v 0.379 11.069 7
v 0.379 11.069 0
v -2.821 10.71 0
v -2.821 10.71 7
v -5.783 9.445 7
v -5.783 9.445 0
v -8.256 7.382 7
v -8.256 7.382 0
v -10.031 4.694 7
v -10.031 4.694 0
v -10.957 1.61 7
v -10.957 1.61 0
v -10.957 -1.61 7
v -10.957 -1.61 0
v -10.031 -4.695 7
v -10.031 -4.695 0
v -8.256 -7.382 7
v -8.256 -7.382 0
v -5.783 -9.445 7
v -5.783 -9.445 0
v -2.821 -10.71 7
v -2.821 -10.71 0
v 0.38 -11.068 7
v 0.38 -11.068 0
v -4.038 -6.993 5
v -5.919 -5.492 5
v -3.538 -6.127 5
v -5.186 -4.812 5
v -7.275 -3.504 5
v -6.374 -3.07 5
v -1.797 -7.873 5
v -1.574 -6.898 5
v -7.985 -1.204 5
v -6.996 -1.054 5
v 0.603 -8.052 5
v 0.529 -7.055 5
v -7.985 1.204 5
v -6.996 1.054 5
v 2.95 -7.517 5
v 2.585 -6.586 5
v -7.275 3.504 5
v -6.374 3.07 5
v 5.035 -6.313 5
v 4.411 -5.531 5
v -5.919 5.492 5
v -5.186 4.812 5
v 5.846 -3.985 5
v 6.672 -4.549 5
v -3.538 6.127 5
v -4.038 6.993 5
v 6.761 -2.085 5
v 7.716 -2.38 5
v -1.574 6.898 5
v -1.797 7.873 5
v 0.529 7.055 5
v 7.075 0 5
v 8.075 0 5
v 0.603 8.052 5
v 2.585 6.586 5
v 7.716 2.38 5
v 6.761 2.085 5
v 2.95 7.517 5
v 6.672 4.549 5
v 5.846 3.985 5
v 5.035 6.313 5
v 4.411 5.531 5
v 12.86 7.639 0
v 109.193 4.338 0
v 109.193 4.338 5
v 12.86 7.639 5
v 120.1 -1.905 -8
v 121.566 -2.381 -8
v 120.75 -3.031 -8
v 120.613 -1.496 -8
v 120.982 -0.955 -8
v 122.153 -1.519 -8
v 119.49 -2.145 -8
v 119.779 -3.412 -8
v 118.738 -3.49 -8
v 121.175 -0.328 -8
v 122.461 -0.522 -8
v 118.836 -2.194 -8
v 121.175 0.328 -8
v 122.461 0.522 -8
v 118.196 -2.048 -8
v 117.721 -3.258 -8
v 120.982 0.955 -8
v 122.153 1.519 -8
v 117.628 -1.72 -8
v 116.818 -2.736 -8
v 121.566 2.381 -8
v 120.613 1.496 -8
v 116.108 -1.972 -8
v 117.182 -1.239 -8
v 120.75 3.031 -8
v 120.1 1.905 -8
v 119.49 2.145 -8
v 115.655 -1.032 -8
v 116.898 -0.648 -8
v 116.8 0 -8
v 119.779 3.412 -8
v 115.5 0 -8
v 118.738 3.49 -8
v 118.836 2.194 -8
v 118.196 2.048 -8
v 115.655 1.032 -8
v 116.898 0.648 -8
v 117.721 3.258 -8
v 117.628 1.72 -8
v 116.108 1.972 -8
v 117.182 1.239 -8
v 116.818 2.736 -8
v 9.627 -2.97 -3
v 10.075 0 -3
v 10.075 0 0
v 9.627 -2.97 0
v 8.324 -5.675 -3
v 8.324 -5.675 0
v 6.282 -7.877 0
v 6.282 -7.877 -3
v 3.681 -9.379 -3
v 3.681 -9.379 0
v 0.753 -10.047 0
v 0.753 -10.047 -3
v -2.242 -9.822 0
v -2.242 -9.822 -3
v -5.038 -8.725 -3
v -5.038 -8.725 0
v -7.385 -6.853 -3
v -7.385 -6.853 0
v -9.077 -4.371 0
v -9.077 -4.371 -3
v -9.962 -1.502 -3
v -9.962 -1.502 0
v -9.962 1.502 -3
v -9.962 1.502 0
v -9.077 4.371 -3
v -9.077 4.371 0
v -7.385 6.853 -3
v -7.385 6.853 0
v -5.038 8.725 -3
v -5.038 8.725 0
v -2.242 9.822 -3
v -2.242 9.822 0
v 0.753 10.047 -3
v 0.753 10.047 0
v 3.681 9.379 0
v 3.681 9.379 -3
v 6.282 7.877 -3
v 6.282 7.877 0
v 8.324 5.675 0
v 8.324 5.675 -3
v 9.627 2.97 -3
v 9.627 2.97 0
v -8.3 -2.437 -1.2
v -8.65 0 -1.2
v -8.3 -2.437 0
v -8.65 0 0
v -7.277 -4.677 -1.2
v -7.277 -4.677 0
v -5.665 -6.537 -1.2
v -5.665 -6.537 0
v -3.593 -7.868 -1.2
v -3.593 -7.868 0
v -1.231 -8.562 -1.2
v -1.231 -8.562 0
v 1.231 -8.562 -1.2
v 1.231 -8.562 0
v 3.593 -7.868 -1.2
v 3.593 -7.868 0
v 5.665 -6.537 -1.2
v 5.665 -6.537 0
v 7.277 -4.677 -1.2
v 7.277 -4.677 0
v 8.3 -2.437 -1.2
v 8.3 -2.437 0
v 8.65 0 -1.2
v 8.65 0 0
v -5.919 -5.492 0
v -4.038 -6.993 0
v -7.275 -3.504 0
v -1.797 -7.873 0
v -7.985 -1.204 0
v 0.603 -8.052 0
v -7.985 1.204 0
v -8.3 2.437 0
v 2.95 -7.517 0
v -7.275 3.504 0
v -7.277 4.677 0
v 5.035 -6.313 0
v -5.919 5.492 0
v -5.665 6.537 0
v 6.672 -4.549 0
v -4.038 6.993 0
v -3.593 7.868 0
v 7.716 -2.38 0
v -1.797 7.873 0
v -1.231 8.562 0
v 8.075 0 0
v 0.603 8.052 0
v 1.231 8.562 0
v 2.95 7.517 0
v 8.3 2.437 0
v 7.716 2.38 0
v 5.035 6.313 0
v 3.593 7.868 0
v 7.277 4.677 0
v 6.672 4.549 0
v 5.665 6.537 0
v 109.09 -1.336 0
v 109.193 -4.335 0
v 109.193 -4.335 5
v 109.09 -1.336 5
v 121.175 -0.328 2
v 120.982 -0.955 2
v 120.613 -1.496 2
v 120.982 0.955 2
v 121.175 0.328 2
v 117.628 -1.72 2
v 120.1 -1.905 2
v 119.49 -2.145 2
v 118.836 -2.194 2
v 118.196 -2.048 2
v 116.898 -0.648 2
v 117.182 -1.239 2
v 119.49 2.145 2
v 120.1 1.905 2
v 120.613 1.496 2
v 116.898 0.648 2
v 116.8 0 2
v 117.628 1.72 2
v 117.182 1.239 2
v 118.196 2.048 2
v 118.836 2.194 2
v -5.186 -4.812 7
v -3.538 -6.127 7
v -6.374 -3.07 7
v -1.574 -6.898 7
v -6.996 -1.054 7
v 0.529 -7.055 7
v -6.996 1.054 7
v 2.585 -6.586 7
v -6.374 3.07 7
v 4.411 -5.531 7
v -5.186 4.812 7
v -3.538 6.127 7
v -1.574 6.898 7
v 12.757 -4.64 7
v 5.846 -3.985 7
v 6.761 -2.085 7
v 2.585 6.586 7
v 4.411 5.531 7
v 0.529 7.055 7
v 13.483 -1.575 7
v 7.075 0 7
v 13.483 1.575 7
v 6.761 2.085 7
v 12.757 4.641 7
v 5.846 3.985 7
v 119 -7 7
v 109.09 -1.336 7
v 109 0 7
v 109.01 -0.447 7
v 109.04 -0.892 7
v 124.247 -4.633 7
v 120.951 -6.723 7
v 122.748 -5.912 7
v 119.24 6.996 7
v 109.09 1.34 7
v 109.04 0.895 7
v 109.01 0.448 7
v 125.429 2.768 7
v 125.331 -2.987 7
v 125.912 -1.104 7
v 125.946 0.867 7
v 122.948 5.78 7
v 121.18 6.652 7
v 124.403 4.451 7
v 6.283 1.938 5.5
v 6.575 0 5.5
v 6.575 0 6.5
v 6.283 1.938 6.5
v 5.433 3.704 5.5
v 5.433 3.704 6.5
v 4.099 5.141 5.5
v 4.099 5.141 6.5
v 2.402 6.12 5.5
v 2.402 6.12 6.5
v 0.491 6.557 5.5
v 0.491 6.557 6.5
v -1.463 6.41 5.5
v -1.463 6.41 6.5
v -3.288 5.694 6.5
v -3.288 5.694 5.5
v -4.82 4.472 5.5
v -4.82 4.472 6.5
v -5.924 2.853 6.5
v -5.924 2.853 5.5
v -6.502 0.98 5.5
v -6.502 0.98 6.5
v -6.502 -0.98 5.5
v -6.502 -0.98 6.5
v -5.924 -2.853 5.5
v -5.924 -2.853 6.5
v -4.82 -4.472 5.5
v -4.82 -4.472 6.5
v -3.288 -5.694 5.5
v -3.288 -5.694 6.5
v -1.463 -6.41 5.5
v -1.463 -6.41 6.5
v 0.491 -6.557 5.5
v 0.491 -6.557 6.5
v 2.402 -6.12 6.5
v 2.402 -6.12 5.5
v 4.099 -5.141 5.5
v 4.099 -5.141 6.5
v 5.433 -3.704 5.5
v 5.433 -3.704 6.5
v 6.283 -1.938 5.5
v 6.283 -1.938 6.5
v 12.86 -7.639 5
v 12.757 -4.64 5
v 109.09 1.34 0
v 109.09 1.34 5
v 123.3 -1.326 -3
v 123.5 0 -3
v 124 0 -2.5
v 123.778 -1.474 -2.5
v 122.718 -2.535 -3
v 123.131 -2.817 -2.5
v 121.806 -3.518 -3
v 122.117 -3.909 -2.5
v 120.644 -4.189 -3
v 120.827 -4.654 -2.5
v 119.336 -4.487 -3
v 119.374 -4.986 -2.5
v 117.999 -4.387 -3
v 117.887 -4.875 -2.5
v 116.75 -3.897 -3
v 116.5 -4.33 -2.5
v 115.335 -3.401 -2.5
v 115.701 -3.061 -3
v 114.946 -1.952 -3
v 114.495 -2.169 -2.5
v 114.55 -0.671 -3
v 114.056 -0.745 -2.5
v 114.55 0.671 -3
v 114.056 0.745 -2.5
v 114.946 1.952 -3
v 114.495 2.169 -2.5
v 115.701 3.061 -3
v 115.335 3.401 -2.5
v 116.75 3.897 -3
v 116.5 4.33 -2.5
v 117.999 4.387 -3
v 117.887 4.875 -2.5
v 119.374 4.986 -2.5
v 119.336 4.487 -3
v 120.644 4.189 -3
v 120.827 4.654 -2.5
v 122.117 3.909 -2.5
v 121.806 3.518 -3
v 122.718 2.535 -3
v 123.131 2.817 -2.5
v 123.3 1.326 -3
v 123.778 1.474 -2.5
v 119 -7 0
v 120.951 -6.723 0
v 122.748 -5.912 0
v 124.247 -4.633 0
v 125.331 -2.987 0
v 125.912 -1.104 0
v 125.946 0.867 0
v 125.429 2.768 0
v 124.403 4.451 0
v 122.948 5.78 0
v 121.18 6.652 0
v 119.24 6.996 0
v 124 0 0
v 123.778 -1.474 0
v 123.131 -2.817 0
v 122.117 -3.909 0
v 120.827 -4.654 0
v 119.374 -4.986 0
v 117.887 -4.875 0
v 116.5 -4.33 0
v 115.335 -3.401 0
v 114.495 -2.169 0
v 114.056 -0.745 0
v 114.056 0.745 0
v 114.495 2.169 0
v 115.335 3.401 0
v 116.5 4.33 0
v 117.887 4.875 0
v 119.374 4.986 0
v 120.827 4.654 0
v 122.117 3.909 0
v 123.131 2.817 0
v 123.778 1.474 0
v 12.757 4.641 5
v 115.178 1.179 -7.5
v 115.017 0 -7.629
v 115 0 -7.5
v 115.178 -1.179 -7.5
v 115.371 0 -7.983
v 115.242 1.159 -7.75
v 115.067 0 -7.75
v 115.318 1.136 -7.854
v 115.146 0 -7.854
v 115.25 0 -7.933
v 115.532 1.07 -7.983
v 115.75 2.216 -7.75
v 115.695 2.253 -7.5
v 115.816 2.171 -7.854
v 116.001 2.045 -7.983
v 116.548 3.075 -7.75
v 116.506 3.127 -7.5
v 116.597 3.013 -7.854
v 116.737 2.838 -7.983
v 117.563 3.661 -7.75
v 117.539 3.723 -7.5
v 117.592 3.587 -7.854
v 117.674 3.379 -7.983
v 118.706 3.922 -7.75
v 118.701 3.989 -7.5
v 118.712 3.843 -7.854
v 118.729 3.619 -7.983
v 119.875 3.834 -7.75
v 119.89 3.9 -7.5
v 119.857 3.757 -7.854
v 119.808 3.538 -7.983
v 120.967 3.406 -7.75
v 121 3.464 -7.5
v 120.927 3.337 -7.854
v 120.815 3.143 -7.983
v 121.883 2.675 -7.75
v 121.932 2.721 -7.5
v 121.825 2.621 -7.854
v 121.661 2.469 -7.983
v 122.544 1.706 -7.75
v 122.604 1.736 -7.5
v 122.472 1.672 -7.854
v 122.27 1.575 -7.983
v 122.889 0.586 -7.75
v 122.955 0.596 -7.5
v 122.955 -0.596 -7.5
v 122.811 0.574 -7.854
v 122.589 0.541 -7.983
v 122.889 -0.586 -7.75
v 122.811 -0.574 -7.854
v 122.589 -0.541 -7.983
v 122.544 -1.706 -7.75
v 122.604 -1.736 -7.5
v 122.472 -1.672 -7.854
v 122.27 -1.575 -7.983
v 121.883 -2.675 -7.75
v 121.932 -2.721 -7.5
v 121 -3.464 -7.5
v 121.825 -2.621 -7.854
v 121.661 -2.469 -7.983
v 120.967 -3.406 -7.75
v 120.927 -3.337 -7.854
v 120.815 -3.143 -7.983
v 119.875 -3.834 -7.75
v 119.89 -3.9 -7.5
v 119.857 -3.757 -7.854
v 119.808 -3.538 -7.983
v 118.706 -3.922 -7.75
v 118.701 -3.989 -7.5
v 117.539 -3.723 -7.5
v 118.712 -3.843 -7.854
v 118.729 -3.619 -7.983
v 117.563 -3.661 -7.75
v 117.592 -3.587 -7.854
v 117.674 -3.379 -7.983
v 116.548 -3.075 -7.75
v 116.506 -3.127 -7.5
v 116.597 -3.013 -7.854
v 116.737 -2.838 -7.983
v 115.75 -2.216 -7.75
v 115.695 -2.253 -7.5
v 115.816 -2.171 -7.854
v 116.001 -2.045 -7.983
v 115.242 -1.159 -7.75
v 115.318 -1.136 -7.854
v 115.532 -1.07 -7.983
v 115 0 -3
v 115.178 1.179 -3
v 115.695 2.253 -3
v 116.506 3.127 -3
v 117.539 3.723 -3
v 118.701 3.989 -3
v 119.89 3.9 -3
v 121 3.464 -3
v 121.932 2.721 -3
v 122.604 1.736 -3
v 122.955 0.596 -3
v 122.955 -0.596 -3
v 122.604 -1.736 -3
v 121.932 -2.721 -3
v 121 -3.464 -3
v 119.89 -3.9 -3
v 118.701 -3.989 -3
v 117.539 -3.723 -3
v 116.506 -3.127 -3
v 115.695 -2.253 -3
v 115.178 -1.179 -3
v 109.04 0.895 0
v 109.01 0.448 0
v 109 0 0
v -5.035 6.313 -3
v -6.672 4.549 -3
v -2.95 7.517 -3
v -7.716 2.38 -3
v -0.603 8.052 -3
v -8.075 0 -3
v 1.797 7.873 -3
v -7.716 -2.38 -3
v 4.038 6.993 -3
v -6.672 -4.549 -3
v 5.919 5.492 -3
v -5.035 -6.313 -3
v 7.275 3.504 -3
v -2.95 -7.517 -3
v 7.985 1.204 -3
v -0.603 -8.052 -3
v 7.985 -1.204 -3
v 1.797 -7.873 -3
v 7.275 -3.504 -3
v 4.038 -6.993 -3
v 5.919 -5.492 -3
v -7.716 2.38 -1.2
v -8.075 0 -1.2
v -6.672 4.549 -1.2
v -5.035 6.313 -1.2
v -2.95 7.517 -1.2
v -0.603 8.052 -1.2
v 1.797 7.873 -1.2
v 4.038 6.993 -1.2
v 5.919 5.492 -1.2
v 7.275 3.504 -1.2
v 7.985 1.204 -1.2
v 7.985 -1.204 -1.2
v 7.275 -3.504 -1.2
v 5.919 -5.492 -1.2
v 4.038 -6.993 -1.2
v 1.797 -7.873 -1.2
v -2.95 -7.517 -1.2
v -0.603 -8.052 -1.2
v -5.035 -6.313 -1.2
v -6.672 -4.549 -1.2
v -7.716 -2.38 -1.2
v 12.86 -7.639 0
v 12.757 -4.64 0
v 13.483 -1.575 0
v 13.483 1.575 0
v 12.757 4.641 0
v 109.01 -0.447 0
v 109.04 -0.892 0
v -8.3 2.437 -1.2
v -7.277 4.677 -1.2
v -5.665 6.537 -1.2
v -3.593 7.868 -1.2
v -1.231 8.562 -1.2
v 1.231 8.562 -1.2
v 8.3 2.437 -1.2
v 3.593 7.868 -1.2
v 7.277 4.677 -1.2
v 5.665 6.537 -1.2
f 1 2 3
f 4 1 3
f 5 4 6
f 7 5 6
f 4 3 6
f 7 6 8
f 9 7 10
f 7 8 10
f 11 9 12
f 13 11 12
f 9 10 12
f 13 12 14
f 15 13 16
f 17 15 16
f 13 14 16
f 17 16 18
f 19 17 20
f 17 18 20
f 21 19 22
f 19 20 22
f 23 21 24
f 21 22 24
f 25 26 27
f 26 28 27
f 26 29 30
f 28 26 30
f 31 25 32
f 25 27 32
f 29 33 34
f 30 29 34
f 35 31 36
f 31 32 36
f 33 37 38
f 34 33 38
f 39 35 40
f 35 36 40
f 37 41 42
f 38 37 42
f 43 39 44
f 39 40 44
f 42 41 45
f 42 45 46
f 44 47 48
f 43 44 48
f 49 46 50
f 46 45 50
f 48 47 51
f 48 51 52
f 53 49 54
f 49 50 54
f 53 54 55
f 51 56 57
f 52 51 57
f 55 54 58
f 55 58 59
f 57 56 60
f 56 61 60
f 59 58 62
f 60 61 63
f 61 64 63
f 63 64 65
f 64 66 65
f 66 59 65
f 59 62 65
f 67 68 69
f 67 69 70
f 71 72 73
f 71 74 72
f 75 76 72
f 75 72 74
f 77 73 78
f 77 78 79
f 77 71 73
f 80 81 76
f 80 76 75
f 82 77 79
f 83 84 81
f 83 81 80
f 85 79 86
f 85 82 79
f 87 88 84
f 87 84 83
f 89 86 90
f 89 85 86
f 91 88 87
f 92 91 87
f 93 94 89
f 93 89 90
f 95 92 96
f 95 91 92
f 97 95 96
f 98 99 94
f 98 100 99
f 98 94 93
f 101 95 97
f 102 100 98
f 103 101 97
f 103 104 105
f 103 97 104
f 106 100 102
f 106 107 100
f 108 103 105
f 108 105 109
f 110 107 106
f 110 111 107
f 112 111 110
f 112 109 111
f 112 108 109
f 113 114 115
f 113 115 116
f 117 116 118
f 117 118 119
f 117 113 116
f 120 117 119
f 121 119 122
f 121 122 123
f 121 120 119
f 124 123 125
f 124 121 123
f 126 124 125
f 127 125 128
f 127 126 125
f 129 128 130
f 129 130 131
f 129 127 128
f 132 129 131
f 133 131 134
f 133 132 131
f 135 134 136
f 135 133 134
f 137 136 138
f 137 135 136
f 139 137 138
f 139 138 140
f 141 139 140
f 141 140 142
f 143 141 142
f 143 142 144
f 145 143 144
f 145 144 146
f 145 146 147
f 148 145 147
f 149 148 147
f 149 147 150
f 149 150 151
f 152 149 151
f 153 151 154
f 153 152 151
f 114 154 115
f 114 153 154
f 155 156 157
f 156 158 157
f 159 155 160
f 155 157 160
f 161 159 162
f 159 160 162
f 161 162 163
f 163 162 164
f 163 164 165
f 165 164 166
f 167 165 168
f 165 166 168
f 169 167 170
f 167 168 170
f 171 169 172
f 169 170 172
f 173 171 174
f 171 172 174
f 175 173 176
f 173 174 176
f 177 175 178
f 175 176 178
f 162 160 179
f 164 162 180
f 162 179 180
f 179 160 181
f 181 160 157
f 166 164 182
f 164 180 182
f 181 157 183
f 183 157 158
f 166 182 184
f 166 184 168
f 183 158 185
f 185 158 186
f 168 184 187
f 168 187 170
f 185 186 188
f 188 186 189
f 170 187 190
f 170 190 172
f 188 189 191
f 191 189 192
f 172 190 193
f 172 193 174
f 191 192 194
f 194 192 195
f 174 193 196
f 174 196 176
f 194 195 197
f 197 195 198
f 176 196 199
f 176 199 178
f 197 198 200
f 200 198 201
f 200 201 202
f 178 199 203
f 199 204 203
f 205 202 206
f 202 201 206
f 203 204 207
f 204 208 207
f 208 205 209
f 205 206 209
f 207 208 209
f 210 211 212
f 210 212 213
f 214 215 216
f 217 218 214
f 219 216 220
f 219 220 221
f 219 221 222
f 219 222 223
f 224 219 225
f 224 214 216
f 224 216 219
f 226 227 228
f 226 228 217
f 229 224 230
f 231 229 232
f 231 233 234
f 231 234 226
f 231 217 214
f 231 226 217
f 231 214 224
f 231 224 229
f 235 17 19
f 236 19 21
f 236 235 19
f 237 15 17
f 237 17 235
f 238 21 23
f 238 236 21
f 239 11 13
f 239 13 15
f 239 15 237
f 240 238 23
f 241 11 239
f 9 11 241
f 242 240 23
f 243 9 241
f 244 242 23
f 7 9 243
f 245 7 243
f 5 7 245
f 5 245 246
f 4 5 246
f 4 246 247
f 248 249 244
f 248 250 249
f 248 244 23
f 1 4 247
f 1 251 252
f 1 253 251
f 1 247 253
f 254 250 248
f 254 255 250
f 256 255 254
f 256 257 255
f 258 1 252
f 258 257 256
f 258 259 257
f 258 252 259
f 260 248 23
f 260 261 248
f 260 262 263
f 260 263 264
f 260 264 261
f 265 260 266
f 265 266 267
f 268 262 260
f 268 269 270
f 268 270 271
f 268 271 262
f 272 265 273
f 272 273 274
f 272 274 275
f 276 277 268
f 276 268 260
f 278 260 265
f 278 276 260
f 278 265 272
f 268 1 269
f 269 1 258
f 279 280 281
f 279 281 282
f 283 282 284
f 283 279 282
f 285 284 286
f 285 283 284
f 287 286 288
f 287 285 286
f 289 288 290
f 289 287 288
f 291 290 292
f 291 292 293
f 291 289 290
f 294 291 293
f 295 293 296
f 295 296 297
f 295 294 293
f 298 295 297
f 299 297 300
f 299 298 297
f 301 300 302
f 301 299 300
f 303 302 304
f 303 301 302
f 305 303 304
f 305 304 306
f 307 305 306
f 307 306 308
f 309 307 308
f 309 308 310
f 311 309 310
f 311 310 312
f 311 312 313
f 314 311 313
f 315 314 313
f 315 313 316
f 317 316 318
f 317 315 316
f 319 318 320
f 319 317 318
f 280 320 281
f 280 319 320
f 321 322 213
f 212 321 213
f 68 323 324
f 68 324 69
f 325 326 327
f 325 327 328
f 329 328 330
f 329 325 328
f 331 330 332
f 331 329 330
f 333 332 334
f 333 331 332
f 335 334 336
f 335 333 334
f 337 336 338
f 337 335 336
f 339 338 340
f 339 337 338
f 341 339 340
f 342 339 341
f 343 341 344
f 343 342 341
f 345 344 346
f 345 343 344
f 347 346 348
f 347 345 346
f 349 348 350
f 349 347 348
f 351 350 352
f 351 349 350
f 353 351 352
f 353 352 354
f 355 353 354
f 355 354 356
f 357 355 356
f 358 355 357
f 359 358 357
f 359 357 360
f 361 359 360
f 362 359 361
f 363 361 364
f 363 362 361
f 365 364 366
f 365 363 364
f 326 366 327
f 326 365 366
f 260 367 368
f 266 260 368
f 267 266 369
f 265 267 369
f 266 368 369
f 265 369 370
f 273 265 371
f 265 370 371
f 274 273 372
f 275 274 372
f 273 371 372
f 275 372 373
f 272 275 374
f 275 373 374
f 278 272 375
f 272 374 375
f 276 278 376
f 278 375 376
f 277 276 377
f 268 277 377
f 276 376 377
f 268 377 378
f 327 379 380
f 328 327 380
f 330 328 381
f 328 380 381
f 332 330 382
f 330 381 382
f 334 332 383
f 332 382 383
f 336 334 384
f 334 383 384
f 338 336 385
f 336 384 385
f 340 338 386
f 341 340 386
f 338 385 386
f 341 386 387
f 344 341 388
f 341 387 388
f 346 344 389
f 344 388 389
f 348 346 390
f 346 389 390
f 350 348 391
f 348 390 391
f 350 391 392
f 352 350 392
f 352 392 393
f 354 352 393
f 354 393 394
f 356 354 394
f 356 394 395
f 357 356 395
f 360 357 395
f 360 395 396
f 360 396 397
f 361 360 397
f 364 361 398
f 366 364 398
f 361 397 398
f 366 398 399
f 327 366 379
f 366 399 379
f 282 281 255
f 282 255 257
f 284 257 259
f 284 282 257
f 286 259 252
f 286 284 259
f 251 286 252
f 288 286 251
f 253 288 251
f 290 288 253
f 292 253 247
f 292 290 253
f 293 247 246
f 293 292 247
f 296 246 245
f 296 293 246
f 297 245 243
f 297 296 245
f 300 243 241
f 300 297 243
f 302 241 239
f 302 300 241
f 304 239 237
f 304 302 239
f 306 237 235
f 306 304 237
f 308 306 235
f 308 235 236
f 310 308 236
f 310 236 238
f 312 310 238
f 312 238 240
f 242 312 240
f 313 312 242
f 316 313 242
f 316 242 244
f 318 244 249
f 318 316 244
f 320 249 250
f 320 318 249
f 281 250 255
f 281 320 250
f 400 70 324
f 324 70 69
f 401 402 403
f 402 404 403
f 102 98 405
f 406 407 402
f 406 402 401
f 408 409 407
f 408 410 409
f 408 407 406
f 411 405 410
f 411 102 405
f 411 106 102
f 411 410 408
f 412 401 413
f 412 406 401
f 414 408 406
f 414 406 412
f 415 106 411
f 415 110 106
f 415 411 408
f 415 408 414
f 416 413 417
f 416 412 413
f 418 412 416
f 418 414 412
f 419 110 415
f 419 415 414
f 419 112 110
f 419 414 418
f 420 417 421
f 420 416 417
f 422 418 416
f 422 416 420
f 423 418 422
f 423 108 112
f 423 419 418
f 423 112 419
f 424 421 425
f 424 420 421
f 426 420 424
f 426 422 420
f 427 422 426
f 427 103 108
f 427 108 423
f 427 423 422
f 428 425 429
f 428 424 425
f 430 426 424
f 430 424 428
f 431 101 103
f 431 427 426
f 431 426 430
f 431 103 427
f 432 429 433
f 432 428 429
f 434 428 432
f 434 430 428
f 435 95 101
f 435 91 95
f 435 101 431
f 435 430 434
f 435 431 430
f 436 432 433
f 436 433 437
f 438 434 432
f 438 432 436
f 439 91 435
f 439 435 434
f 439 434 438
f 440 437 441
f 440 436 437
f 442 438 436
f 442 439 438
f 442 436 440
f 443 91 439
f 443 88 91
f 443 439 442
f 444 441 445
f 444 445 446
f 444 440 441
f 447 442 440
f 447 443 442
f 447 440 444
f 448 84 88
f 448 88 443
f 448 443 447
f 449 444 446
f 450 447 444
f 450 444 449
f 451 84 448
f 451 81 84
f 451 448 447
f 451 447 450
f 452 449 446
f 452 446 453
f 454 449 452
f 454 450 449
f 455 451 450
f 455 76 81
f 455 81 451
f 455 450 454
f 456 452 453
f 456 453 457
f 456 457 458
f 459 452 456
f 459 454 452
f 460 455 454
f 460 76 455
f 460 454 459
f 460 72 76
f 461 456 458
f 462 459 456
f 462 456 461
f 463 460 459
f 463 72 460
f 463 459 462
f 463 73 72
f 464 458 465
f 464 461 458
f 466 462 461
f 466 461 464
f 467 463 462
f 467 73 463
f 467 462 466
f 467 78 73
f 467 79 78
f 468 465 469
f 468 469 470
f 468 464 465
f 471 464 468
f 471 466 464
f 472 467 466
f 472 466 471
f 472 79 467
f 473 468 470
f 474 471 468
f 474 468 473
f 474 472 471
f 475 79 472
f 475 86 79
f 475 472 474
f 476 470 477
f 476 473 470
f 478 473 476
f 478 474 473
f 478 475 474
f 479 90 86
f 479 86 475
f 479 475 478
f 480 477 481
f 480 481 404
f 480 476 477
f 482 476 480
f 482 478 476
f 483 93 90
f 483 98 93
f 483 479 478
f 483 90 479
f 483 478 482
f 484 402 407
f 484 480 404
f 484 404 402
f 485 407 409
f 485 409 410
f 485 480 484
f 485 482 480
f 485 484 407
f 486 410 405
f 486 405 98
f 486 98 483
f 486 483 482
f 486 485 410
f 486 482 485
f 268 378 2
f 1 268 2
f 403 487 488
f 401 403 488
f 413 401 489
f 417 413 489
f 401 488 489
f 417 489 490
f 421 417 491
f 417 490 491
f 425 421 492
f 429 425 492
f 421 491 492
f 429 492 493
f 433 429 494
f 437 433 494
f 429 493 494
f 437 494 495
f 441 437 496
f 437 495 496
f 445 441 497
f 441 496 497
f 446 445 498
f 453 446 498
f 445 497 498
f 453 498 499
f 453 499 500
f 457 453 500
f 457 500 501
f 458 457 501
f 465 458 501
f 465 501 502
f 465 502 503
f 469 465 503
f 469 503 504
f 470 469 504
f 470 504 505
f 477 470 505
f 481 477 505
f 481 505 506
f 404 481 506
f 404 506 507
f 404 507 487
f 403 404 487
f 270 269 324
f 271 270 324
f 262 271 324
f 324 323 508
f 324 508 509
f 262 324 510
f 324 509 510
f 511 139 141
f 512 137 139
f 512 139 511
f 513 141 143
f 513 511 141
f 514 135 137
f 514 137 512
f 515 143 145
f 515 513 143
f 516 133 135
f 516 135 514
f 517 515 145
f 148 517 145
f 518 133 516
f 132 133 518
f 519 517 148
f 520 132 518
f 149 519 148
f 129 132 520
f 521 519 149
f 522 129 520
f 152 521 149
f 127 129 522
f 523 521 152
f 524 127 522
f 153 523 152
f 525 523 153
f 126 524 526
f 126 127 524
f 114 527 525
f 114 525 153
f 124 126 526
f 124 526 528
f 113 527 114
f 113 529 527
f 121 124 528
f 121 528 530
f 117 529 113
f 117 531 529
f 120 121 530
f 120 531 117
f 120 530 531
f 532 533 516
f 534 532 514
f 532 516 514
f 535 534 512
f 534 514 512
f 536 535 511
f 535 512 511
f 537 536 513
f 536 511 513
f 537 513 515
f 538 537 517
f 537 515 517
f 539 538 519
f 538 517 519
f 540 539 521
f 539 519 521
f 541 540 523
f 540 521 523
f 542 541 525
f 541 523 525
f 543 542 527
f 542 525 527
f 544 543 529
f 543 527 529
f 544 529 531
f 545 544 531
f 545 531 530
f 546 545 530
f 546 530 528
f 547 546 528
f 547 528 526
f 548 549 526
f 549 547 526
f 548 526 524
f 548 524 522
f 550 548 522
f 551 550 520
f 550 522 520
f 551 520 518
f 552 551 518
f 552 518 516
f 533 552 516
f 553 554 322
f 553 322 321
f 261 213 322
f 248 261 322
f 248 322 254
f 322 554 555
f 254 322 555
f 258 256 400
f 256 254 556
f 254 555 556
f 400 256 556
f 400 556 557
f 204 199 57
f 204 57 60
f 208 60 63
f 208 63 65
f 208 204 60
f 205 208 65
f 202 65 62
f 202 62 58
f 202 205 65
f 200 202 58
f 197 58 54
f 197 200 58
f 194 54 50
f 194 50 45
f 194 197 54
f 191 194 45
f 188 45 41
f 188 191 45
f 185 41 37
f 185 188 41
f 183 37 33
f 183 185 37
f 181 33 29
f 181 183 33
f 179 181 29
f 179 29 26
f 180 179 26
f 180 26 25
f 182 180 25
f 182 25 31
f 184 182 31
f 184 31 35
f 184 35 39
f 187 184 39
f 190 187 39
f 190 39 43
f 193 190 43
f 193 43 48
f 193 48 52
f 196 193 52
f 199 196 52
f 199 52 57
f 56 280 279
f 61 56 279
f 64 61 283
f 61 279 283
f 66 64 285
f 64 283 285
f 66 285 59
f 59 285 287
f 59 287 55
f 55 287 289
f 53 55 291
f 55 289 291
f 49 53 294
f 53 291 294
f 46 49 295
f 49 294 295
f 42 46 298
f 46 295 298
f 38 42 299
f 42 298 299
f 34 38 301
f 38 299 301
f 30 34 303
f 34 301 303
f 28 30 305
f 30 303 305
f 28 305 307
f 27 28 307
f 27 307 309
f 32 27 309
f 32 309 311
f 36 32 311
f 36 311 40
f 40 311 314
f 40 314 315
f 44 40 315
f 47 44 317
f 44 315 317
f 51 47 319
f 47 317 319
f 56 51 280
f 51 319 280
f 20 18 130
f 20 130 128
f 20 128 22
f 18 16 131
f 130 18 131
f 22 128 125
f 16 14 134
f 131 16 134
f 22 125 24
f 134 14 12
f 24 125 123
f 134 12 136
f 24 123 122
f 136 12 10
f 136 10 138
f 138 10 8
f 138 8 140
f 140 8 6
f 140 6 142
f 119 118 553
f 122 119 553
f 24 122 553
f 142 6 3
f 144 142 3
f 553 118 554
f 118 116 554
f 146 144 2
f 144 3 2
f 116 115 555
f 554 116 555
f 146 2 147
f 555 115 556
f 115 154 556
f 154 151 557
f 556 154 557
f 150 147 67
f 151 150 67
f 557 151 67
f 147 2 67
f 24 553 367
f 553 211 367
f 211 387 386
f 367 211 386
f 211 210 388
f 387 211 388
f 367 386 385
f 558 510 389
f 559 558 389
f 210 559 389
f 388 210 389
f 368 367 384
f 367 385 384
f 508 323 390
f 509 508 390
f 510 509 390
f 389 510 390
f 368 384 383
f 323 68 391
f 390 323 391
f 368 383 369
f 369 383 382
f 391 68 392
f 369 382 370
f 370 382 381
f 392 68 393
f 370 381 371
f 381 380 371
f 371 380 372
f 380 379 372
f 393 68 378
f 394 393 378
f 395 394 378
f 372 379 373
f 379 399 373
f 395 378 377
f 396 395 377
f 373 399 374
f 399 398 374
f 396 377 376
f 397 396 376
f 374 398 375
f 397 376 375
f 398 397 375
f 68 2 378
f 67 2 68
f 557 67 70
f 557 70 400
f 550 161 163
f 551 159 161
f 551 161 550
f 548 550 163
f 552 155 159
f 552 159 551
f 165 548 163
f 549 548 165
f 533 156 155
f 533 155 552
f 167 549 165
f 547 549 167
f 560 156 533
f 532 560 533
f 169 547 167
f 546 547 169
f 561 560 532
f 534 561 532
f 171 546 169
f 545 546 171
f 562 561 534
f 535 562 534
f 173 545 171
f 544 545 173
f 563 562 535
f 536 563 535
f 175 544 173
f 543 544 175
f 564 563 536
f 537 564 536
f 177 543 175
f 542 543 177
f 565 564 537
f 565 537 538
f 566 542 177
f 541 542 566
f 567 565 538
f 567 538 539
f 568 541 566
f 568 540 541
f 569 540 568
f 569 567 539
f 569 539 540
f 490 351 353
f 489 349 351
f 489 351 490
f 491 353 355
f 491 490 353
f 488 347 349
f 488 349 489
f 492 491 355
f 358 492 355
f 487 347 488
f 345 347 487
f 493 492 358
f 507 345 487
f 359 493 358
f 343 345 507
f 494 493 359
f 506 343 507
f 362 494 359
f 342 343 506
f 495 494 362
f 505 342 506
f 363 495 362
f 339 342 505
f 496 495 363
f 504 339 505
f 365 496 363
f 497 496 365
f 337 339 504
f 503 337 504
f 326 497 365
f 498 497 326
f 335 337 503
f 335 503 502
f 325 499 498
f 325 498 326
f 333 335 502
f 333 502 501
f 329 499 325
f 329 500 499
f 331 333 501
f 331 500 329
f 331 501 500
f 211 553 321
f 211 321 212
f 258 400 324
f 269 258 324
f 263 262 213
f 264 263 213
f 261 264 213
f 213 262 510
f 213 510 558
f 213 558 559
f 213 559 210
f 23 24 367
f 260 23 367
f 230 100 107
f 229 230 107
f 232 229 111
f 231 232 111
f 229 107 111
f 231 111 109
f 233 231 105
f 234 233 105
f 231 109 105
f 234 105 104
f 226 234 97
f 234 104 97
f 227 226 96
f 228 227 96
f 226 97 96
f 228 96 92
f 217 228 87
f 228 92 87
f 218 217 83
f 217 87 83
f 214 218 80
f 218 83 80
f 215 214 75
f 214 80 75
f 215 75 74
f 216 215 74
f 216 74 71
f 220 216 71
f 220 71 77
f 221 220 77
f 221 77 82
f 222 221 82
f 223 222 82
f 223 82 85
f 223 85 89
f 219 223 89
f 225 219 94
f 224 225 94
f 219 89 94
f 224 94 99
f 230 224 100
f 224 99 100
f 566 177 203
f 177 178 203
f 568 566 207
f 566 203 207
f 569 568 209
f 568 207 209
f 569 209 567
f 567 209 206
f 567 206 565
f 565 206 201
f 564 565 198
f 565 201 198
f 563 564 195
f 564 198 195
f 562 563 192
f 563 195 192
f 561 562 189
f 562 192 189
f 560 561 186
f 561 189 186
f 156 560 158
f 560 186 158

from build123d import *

# Parameters (mm, degrees)
SKETCH_1_R          = 8.075
EXTRUDE_1_DEPTH     = 7
EXTRUDE_START       = -2
SKETCH_2_R          = 8.075
SKETCH_2_R_2        = 6.575
EXTRUDE_2_DEPTH     = 2
SKETCH_3_R          = 4
EXTRUDE_3_DEPTH     = 10
SKETCH_4_R          = 5
SKETCH_4_R_2        = 4
EXTRUDE_4_DEPTH     = 3
CHAMFER_1_SIZE      = 0.5
CUT_EXTRUDE_1_DEPTH = 7
CUT_EXTRUDE_2_DEPTH = 5
CUT_EXTRUDE_START   = -2
SKETCH_8_R          = 4
CUT_EXTRUDE_3_DEPTH = 2
FILLET_1_R          = 0.5
SKETCH_9_R          = 2.2
CUT_EXTRUDE_4_DEPTH = 10
EXTRUDE_START_2     = 3
SKETCH_10_R         = 10.075
SKETCH_10_R_2       = 8.075
EXTRUDE_5_DEPTH     = 3


with BuildPart() as part:
    # 草图1 → 凸台-拉伸1 (new body)
    with BuildSketch(Plane.XY):
        with BuildLine():
            ThreePointArc((0.37924895, 11.068504652), (-11.074999998, -0.000191538), (0.379631801, -11.068491528))
            Line((0.379631801, -11.068491528), (119, -7))
            ThreePointArc((119, -7), (125.998973572, -0.119870518), (119.239705882, 6.995894588))
            Line((119.239705882, 6.995894588), (0.37924895, 11.068504652))
        make_face()
        Circle(SKETCH_1_R, mode=Mode.SUBTRACT)
    extrude(amount=EXTRUDE_1_DEPTH)

    # 草图2 → 凸台-拉伸2 (add)
    with BuildSketch(Plane.XY.offset(7).offset(EXTRUDE_START)):
        Circle(SKETCH_2_R)
        Circle(SKETCH_2_R_2, mode=Mode.SUBTRACT)
    extrude(amount=EXTRUDE_2_DEPTH)

    # 草图3 → 凸台-拉伸3 (add)
    with BuildSketch(Plane(origin=(0, 0, 0), x_dir=(-1, 0, 0), z_dir=(0, 0, -1))):
        with Locations((-119, 0)):
            Circle(SKETCH_3_R)
    extrude(amount=EXTRUDE_3_DEPTH)

    # 草图4 → 凸台-拉伸4 (add)
    with BuildSketch(Plane(origin=(0, 0, 0), x_dir=(-1, 0, 0), z_dir=(0, 0, -1))):
        with Locations(Location((-119, 0, 0), (0, 0, 180))):
            Circle(SKETCH_4_R)
        with Locations((-119, 0)):
            Circle(SKETCH_4_R_2, mode=Mode.SUBTRACT)
    extrude(amount=EXTRUDE_4_DEPTH)

    # 倒角1
    chamfer_1_edges = [part.edges().sort_by_distance(p)[0] for p in [
        (-6.575, 0, 5),
        (-6.575, 0, 7),
        (123, 0, -10),
        (114, 0, -3),
    ]]
    chamfer(chamfer_1_edges, length=CHAMFER_1_SIZE)

    # 草图5 → 切除-拉伸1 (cut)
    with BuildSketch(Plane(origin=(0, 0, 0), x_dir=(-1, 0, 0), z_dir=(0, 0, -1))):
        with BuildLine():
            ThreePointArc((-12.757234161, -4.640431182), (-13.574999998, 0.000234775), (-12.757073645, 4.640872443))
            Line((-12.757073645, 4.640872443), (-109.090204802, 1.340134001))
            ThreePointArc((-109.090204802, 1.340134001), (-109.022576686, 0.671583213), (-109, 0))
            ThreePointArc((-109, 0), (-109.022449652, -0.669693251), (-109.08969781, -1.336379625))
            Line((-109.08969781, -1.336379625), (-12.757234161, -4.640431182))
        make_face()
    extrude(amount=-CUT_EXTRUDE_1_DEPTH, mode=Mode.SUBTRACT)

    # 草图6 → 切除-拉伸2 (cut)
    with BuildSketch(Plane(origin=(0, 0, 0), x_dir=(-1, 0, 0), z_dir=(0, 0, -1))):
        Polygon((-109.08969781, -1.336379625), (-12.757234161, -4.640431182), (-12.860068961, -7.638668165), (-109.192532609, -4.334616608), align=None)
        Polygon((-12.757073645, 4.640872443), (-109.090204802, 1.340134001), (-109.192935895, 4.338374538), (-12.859804737, 7.63911298), align=None)
    extrude(amount=-CUT_EXTRUDE_2_DEPTH, mode=Mode.SUBTRACT)

    # 草图8 → 切除-拉伸3 (cut)
    with BuildSketch(Plane(origin=(0, 0, -10), x_dir=(-1, 0, 0), z_dir=(0, 0, -1)).offset(CUT_EXTRUDE_START)):
        with Locations((-119, 0)):
            Circle(SKETCH_8_R)
    extrude(amount=CUT_EXTRUDE_3_DEPTH, mode=Mode.SUBTRACT)

    # 圆角1
    fillet_1_edges = [part.edges().sort_by_distance(p)[0] for p in [
        (123, 0, -8),
    ]]
    fillet(fillet_1_edges, radius=FILLET_1_R)

    # 草图9 → 切除-拉伸4 (cut)
    with BuildSketch(Plane(origin=(0, 0, -8), x_dir=(-1, 0, 0), z_dir=(0, 0, -1))):
        with Locations((-119, 0)):
            Circle(SKETCH_9_R)
    extrude(amount=-CUT_EXTRUDE_4_DEPTH, mode=Mode.SUBTRACT)

    # 草图10 → 凸台-拉伸5 (add)
    with BuildSketch(Plane(origin=(0, 0, 0), x_dir=(-1, 0, 0), z_dir=(0, 0, -1)).offset(EXTRUDE_START_2)):
        with Locations(Location((0, 0, 0), (0, 0, 180))):
            Circle(SKETCH_10_R)
        Circle(SKETCH_10_R_2, mode=Mode.SUBTRACT)
    extrude(amount=-EXTRUDE_5_DEPTH)

    # 切除-旋转2: read off the stored shape, not the designer's step
    # 切除-旋转2: loft between two sections, ruled curve by curve
    cut_revolve_2_from = [
        Edge.make_three_point_arc((8.65, 0, -1.2), (0, 8.65, -1.2), (-8.65, 0, -1.2)),
        Edge.make_three_point_arc((-8.65, 0, -1.2), (0, -8.65, -1.2), (8.65, 0, -1.2)),
    ]
    cut_revolve_2_to = [
        Edge.make_three_point_arc((8.65, 0, 0), (0, 8.65, 0), (-8.65, 0, 0)),
        Edge.make_three_point_arc((-8.65, 0, 0), (0, -8.65, 0), (8.65, 0, 0)),
    ]
    cut_revolve_2 = Solid(Shell([*[Face.make_surface_from_curves(cut_revolve_2_from[k], cut_revolve_2_to[k]) for k in range(2)], Face(Wire(cut_revolve_2_from)), Face(Wire(cut_revolve_2_to))]))
    add(cut_revolve_2, mode=Mode.SUBTRACT)


solid = part.part
